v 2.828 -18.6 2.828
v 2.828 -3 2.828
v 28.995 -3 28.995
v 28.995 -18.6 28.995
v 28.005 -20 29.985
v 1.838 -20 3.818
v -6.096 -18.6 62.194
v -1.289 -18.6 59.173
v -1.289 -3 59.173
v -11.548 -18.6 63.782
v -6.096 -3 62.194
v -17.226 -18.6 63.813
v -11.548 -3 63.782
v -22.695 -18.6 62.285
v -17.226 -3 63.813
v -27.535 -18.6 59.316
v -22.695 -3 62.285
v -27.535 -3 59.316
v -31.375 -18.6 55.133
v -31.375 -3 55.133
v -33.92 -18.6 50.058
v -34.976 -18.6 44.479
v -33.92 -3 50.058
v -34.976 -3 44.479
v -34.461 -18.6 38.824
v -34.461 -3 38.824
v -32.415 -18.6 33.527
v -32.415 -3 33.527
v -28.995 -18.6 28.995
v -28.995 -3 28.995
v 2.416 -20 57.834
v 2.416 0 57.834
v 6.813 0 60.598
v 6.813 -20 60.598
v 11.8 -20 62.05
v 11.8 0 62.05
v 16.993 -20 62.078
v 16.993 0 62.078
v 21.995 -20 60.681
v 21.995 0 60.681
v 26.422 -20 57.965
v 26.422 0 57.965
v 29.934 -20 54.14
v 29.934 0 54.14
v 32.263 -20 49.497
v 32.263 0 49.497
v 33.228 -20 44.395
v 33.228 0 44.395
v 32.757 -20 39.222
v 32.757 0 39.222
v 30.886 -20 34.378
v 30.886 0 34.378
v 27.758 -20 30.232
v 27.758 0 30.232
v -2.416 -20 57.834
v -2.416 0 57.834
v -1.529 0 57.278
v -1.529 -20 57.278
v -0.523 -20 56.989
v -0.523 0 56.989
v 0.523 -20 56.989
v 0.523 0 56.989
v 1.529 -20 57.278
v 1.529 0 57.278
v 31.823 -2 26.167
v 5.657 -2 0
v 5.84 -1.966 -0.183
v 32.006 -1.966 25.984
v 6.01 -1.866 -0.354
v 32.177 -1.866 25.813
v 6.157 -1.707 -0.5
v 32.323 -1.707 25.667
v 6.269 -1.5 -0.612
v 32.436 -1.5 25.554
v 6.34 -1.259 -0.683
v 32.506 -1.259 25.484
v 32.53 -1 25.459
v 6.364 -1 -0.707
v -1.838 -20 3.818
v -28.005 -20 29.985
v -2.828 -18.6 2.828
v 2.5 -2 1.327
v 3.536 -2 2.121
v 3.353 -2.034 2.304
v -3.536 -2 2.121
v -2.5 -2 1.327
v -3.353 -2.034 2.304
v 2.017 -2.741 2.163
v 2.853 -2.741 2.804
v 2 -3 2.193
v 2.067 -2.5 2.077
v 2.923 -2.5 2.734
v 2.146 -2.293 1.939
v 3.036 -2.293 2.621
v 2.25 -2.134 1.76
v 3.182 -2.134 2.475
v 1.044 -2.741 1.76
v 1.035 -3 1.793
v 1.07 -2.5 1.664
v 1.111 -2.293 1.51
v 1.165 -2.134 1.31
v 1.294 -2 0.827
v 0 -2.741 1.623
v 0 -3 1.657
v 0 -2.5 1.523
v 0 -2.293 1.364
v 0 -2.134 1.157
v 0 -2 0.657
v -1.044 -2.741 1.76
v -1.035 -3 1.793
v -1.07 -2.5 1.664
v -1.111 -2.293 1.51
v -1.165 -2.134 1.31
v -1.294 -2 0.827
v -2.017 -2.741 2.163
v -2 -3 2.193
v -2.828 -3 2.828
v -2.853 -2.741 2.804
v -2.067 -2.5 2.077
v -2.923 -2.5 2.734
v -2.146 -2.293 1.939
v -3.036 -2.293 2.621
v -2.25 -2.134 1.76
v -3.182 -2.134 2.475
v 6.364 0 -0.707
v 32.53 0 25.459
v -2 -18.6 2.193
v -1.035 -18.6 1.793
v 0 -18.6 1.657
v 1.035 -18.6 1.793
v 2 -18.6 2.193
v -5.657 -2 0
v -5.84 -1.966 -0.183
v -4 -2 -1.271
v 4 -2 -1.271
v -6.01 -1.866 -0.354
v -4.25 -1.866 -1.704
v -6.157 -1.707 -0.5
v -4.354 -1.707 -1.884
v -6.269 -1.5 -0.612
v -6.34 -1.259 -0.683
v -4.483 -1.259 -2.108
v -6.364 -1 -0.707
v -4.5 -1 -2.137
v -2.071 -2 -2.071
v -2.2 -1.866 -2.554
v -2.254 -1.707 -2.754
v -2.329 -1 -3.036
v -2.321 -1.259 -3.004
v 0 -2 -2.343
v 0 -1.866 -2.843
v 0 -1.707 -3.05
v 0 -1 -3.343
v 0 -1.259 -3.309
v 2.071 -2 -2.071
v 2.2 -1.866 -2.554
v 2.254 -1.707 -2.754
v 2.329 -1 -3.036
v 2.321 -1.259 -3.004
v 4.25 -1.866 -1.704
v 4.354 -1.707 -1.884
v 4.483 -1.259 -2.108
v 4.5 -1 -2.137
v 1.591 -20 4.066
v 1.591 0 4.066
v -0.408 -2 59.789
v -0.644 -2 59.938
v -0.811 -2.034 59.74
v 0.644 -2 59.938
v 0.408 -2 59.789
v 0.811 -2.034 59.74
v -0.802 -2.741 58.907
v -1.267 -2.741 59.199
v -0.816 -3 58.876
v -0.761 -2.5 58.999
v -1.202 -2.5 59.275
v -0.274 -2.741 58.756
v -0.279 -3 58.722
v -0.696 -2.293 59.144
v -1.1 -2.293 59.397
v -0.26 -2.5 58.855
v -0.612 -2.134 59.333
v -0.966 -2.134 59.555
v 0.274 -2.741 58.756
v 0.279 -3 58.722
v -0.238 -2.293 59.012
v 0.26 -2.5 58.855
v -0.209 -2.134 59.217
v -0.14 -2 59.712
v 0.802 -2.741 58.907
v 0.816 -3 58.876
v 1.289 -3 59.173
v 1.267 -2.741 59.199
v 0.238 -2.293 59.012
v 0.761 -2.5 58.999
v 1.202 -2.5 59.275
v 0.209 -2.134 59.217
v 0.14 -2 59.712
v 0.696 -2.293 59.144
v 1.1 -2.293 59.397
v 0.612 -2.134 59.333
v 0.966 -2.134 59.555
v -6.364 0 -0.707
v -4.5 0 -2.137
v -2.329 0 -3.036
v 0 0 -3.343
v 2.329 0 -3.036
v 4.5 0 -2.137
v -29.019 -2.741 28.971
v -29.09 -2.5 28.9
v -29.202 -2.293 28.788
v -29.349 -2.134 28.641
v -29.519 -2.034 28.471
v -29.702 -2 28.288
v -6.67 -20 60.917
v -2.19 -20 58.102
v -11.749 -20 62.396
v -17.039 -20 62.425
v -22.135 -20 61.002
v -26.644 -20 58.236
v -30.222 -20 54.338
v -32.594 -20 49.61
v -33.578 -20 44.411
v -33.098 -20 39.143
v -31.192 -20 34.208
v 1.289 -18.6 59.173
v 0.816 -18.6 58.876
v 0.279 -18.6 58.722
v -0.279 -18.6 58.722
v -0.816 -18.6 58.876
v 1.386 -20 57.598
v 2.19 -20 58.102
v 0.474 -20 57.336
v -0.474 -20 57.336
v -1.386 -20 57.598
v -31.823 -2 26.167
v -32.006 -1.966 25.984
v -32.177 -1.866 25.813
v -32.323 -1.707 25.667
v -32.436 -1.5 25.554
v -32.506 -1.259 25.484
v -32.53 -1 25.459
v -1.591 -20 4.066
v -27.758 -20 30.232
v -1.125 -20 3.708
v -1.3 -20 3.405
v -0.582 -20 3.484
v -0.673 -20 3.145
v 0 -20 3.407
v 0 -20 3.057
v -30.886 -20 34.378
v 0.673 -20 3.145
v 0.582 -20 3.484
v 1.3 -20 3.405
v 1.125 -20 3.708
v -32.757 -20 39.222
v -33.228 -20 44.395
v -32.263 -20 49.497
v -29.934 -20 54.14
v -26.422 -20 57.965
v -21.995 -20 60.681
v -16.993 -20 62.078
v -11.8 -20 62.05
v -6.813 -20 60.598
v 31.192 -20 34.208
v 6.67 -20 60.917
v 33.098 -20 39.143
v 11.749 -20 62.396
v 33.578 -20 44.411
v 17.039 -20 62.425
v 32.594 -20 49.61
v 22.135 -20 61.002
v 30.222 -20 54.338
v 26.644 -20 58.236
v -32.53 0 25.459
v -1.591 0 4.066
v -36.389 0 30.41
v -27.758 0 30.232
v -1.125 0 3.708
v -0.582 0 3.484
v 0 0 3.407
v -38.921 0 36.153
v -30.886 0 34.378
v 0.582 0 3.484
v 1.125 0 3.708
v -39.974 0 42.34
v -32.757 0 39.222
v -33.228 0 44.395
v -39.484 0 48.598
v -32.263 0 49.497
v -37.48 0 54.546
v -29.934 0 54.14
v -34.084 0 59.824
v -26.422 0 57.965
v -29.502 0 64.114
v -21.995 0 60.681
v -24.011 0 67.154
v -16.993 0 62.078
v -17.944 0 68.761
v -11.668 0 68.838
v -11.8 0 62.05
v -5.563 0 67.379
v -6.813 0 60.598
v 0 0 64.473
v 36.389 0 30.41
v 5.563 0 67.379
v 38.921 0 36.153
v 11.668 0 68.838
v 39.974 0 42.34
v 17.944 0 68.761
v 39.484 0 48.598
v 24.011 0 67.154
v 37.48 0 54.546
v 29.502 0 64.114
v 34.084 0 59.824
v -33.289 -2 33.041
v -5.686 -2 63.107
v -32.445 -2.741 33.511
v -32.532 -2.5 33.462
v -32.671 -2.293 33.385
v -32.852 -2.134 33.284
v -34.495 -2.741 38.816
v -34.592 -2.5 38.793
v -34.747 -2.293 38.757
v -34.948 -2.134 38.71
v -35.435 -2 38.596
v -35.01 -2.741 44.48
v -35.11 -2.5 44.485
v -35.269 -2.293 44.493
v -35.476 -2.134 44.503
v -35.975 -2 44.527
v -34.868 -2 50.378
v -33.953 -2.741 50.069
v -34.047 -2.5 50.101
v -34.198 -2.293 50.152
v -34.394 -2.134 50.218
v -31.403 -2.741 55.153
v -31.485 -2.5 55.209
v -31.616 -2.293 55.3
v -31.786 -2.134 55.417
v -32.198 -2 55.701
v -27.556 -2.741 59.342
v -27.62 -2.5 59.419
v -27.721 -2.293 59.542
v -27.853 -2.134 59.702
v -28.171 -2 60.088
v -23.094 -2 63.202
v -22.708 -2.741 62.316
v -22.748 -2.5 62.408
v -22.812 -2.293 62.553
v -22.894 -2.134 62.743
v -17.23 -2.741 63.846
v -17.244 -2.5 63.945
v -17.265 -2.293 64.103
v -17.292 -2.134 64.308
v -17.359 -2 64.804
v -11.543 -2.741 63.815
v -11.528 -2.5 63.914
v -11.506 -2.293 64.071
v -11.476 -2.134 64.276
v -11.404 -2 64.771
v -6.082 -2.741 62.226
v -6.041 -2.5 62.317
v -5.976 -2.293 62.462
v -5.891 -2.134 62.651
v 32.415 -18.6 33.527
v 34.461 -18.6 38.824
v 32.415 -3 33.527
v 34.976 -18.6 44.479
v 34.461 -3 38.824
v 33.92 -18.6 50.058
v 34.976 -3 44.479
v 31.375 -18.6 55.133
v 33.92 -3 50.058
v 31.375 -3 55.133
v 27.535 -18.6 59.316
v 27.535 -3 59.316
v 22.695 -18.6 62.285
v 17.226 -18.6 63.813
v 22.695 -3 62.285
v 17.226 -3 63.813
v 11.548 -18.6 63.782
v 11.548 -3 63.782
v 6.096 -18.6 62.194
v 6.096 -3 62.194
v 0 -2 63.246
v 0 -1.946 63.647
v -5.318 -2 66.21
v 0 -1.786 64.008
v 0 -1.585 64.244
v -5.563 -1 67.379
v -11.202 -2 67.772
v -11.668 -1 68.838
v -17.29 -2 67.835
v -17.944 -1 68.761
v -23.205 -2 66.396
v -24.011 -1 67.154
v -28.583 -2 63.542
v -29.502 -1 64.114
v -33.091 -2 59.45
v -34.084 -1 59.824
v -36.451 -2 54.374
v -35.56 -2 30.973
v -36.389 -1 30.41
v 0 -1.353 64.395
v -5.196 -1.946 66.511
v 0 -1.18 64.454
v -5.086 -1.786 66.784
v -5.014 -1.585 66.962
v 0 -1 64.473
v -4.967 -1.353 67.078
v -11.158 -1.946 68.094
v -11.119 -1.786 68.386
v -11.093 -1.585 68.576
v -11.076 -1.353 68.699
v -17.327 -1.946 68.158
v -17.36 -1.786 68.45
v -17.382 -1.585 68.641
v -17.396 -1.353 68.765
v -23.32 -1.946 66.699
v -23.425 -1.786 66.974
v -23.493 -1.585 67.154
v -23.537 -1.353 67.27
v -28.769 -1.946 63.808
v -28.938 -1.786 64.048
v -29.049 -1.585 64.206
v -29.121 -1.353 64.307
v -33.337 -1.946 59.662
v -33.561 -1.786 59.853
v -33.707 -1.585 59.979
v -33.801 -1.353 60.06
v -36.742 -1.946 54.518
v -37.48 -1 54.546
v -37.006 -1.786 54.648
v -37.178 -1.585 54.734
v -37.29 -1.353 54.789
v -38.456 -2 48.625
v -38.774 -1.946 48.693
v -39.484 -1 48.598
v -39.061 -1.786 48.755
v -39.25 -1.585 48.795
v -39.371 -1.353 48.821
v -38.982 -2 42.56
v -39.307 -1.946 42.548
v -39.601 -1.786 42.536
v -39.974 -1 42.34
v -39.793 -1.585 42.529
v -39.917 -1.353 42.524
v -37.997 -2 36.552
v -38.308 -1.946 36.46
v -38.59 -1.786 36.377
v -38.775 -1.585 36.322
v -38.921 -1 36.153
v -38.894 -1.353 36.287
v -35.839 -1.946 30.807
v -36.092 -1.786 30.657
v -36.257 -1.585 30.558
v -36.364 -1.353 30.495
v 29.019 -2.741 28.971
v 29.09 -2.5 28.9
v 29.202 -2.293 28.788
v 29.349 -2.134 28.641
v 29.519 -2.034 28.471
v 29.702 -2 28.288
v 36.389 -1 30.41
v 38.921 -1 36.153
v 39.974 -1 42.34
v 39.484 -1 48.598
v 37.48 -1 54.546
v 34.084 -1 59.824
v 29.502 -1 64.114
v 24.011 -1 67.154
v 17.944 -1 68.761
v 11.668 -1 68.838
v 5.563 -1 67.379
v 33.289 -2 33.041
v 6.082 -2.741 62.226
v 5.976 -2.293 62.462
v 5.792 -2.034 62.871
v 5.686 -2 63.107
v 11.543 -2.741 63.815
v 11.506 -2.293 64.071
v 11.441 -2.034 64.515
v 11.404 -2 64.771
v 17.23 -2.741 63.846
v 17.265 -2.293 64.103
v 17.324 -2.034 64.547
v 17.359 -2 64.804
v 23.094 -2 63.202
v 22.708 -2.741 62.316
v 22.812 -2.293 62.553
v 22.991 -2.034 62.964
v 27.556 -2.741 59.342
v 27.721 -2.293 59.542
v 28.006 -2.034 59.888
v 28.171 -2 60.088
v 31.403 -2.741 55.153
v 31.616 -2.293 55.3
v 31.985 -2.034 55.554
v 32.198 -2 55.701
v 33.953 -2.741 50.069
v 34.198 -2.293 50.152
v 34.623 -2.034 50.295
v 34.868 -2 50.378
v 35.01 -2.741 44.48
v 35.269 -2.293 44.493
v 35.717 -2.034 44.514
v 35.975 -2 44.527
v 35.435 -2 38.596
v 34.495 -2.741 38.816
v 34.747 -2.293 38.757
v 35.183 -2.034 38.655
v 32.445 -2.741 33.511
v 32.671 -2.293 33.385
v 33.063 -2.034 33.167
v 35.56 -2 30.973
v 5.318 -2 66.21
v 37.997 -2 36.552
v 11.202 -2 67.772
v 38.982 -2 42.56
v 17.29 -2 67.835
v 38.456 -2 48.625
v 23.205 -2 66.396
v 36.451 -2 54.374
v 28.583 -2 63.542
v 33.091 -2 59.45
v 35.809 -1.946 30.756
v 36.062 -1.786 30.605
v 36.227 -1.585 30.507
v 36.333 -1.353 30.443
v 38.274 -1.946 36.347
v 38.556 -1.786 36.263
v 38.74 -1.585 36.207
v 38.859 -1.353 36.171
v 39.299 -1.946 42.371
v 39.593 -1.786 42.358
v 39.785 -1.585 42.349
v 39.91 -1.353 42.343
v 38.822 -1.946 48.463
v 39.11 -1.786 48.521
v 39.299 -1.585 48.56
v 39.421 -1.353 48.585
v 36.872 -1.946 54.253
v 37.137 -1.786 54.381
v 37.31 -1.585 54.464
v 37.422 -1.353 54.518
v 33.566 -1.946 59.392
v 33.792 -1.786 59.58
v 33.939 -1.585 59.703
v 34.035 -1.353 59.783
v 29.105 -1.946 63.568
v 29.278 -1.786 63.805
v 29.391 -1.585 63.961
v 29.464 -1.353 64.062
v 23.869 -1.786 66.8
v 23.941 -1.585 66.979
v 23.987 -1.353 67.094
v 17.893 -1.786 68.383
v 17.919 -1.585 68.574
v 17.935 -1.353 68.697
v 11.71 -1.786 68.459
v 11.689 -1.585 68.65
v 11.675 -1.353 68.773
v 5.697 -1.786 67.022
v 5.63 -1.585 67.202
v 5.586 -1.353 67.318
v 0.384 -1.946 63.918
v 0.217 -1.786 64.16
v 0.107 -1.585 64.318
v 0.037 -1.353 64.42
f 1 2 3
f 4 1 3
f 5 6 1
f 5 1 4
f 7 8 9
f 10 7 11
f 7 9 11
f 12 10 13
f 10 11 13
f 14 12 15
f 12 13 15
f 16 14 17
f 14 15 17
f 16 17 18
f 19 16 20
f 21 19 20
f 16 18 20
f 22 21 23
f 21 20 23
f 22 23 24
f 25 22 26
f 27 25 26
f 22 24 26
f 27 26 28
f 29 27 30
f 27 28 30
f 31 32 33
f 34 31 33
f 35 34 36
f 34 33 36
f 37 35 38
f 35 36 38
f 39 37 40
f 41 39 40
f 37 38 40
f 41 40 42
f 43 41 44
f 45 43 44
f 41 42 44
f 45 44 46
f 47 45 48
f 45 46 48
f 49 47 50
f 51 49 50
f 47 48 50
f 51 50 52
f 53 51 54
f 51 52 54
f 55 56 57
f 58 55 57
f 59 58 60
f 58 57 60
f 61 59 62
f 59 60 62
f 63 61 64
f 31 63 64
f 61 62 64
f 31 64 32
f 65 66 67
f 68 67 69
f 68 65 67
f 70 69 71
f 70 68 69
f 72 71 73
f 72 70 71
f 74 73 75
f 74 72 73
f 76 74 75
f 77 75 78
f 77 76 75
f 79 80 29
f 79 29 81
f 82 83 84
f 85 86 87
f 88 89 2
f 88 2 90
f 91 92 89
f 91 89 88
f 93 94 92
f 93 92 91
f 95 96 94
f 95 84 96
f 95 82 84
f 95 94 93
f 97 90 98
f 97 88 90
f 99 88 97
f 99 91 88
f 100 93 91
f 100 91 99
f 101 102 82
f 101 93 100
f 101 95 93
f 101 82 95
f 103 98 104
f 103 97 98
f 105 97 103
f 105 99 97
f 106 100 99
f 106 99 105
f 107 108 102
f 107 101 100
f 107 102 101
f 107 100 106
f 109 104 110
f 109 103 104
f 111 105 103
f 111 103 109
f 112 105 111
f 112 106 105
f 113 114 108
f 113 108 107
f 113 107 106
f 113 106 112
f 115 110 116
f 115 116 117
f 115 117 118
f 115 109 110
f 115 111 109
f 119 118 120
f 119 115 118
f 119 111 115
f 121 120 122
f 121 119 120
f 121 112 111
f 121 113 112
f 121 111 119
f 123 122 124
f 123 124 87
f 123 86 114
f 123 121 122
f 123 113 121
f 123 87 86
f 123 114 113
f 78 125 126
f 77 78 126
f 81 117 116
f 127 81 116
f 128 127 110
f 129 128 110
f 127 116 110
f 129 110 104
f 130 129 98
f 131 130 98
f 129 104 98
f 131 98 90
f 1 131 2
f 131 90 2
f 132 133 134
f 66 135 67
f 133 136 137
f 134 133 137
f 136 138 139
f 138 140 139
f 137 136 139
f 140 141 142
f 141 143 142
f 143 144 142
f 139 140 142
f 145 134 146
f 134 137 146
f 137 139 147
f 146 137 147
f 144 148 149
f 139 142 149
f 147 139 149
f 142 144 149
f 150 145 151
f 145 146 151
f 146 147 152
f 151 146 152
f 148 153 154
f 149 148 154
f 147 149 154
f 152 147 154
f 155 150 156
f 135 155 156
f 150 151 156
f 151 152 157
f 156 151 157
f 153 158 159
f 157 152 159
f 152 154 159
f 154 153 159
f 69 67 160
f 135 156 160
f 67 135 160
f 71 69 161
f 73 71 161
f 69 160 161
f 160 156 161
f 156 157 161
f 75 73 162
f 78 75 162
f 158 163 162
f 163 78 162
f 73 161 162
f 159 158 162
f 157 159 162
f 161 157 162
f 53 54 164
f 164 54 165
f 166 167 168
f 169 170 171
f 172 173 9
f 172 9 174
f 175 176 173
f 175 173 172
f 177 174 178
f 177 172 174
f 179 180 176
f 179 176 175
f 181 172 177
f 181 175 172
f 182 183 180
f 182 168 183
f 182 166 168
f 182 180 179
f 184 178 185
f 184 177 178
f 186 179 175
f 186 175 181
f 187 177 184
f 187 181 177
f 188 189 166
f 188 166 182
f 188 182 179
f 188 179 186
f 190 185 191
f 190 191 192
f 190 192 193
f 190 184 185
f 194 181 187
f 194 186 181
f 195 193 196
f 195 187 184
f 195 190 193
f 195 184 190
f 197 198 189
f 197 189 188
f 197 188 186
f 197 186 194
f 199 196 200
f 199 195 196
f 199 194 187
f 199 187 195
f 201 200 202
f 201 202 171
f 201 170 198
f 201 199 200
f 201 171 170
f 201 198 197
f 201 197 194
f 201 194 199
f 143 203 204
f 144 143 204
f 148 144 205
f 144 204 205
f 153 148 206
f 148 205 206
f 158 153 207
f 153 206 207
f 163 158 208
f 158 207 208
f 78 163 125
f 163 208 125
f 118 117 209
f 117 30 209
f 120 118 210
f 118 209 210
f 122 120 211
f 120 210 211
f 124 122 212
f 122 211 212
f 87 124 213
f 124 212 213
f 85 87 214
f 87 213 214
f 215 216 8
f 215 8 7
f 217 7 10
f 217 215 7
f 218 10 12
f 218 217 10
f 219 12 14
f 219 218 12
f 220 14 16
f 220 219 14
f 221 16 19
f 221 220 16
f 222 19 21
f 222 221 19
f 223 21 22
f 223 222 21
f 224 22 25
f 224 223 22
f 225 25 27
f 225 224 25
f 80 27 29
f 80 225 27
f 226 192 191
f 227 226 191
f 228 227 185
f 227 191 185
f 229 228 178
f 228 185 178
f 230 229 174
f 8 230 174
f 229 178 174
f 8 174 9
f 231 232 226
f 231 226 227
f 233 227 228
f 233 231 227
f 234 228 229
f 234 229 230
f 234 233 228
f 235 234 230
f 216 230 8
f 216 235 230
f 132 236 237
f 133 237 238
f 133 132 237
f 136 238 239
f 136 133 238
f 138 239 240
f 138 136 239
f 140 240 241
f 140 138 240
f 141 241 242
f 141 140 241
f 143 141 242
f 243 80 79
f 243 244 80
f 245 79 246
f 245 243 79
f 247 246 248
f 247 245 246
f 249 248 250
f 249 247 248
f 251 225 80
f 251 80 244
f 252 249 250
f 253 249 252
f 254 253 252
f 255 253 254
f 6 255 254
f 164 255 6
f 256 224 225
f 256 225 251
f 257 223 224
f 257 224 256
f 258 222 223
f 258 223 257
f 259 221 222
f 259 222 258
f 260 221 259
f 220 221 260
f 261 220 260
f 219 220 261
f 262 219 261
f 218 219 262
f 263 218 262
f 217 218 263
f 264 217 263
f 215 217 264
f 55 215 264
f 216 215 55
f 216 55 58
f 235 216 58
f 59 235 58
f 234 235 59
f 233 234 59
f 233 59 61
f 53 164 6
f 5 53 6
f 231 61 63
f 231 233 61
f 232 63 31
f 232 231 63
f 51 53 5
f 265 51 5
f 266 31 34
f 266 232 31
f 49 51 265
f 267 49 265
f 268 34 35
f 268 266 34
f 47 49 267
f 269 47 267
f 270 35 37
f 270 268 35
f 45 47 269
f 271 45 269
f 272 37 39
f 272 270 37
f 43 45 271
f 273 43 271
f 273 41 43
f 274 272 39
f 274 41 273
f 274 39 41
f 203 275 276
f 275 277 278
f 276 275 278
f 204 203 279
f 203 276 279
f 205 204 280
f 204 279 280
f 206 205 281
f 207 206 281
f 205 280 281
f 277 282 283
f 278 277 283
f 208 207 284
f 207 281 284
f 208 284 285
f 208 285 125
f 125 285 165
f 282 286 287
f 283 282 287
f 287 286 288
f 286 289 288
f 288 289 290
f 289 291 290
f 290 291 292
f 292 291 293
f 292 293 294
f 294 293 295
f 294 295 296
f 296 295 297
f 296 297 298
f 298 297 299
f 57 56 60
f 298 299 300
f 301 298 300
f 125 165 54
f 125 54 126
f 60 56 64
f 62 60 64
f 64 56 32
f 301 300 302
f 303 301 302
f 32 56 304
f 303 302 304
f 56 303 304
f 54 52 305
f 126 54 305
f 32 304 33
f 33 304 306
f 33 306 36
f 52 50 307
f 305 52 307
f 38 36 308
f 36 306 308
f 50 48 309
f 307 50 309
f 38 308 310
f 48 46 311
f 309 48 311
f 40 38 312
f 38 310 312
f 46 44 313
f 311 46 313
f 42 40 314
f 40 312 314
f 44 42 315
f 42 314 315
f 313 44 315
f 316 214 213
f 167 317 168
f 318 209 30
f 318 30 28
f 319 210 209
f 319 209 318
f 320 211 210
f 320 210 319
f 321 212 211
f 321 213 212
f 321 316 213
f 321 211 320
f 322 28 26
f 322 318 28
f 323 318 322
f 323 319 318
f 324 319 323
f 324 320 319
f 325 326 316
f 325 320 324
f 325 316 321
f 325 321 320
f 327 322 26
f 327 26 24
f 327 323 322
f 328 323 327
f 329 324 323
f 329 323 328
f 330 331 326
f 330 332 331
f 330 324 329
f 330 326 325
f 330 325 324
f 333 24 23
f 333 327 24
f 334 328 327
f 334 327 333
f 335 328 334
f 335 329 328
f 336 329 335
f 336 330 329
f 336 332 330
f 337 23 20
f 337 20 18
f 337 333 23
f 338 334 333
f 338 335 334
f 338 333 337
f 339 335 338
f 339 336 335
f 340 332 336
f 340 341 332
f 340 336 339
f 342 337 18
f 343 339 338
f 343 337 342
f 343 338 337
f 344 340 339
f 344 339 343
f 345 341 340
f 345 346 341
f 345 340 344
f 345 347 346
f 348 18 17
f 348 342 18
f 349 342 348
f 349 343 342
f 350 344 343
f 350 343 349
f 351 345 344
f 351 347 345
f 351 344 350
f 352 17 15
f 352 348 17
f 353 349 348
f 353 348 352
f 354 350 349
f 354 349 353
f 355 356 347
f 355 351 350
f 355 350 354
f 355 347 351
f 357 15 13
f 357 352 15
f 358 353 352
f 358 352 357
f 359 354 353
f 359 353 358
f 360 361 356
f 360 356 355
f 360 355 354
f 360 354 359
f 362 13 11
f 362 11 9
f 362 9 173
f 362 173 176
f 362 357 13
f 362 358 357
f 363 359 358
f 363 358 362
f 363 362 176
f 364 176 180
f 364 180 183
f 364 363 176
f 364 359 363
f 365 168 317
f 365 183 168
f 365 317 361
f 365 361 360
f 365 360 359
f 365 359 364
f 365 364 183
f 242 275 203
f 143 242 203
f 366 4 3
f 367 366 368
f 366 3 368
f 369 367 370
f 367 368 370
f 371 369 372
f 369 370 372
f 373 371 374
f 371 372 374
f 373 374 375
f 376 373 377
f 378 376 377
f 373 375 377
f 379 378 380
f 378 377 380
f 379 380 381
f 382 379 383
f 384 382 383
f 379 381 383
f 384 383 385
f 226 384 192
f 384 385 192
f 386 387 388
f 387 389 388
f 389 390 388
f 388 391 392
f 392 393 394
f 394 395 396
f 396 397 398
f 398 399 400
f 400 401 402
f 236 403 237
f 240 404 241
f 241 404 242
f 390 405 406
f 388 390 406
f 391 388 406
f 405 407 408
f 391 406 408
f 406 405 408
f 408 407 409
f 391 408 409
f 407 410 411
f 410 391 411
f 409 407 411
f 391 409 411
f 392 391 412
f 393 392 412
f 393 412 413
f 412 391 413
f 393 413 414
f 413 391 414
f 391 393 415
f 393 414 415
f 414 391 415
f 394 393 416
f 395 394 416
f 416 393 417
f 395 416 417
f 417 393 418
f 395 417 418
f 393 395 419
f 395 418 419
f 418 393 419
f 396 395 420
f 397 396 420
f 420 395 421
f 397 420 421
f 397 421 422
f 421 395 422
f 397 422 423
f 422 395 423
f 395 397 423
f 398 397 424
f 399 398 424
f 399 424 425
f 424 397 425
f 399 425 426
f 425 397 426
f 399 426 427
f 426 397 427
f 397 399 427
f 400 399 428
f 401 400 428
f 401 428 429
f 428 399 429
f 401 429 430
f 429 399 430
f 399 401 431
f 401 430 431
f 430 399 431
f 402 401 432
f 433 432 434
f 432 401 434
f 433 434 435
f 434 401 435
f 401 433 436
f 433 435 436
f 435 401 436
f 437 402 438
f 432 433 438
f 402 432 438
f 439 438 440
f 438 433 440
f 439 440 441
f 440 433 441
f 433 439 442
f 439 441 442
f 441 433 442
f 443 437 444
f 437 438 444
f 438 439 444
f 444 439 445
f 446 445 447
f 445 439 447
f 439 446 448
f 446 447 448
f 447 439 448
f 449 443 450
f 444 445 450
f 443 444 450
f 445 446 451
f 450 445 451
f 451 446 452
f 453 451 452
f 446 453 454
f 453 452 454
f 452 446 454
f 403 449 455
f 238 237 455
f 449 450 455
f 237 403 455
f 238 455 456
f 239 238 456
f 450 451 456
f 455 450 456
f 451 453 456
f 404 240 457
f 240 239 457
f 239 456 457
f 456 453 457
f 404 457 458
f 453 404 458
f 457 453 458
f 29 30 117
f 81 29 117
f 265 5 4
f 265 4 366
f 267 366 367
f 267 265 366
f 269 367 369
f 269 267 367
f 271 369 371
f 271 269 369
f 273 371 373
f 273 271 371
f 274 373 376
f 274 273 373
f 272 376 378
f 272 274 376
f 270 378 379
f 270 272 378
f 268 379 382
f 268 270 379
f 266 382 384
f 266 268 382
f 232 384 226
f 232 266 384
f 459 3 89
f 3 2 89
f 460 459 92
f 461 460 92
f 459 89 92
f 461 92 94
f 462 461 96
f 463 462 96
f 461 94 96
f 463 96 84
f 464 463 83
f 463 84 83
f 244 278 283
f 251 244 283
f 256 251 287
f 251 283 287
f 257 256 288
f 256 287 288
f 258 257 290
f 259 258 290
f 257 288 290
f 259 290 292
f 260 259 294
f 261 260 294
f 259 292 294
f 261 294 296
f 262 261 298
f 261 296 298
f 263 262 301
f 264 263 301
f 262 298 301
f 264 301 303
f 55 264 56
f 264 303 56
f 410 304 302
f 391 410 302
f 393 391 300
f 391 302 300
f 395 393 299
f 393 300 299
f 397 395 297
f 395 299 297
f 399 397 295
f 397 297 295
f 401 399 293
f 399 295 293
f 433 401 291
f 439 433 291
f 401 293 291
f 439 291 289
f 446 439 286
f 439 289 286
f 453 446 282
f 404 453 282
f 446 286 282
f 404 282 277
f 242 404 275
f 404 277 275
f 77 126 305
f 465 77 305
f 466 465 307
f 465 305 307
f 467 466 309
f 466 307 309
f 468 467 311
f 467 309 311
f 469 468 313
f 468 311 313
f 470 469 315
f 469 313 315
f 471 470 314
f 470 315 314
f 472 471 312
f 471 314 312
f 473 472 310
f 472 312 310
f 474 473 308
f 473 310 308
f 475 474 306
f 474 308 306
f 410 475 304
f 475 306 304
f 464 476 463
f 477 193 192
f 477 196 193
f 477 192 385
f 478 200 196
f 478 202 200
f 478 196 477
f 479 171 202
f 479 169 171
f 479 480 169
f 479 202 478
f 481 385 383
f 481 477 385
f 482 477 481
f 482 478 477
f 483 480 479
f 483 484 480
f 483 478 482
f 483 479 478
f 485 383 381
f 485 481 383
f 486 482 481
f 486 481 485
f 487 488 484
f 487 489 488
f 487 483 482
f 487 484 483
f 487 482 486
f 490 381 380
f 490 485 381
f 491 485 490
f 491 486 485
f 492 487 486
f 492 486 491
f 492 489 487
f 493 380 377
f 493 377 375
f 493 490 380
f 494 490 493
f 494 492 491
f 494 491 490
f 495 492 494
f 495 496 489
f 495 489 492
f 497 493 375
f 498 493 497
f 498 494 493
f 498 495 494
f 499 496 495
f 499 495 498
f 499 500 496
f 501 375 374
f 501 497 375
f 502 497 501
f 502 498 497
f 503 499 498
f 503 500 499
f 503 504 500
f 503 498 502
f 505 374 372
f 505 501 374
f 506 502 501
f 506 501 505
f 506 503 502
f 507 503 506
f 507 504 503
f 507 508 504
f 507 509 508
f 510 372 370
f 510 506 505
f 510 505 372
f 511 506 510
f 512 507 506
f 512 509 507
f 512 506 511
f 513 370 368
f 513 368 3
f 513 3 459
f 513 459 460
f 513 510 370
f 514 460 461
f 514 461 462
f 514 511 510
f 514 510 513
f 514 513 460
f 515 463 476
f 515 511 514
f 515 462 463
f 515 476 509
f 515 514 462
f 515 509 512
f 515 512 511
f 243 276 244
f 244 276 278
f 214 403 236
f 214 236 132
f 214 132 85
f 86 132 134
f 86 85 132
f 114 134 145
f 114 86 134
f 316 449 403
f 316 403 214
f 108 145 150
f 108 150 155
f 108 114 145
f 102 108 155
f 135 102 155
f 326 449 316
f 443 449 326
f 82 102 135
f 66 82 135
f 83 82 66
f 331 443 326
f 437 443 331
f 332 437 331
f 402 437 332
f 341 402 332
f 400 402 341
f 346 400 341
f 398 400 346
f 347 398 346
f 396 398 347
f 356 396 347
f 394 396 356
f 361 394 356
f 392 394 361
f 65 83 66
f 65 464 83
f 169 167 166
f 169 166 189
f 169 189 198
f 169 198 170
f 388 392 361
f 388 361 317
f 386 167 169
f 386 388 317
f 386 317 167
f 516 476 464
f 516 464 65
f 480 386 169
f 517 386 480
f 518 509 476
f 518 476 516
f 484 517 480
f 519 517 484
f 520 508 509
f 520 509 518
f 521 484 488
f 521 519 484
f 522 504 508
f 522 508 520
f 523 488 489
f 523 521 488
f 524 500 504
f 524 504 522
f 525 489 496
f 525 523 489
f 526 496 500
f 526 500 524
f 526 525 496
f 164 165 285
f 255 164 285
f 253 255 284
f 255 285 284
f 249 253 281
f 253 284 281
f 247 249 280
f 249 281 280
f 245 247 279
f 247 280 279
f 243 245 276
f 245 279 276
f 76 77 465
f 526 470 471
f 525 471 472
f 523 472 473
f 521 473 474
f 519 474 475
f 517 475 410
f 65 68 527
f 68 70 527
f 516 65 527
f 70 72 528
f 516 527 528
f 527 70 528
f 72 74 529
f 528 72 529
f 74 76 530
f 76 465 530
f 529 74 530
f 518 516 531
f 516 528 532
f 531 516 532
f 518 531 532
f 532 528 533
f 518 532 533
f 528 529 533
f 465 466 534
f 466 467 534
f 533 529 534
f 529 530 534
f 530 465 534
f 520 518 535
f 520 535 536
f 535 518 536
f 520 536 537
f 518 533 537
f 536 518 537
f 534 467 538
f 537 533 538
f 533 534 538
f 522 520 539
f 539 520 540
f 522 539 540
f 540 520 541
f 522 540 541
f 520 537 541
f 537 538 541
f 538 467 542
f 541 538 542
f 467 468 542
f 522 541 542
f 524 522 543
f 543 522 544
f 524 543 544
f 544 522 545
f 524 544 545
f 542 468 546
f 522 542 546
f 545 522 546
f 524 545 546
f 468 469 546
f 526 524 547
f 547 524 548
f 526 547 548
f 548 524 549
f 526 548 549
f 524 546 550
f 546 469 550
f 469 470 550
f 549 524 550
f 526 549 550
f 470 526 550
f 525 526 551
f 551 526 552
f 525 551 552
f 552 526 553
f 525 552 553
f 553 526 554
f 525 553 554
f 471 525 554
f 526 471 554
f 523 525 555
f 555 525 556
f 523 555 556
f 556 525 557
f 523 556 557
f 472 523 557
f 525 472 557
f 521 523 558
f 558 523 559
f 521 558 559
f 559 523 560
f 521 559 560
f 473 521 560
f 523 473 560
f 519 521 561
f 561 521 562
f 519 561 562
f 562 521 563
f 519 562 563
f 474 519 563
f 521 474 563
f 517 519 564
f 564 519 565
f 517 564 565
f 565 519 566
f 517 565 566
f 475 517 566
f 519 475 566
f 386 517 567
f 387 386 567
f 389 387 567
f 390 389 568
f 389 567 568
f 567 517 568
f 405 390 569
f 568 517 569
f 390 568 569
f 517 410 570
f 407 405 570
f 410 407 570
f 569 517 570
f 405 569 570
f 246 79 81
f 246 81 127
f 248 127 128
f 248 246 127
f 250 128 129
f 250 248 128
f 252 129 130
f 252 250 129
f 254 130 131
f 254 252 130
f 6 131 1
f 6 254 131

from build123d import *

# Parameters (mm, degrees)
F1_DEPTH = 20
F2_DEPTH = 2
F3_SIZE  = 1.4
F4_R     = 1


with BuildPart() as f1:
    # F0 (on Front) → F1 (new body)
    with BuildSketch(Plane.XZ):
        with BuildLine():
            Line((-28.994949, 28.994949), (-2.828427, 2.828427))
            ThreePointArc((-2.828427, 2.828427), (0, 1.656854), (2.828427, 2.828427))
            Line((2.828427, 2.828427), (28.994949, 28.994949))
            ThreePointArc((28.994949, 28.994949), (29.600194, 57.358261), (1.28852, 59.172891))
            ThreePointArc((1.28852, 59.172891), (0, 58.702505), (-1.28852, 59.172891))
            ThreePointArc((-1.28852, 59.172891), (-29.600194, 57.358261), (-28.994949, 28.994949))
        make_face()
        with BuildLine():
            ThreePointArc((1.59099, 4.065864), (0, 3.406854), (-1.59099, 4.065864))
            Line((-1.59099, 4.065864), (-27.757512, 30.232386))
            ThreePointArc((-27.757512, 30.232386), (-28.311096, 56.174738), (-2.415975, 57.83448))
            ThreePointArc((-2.415975, 57.83448), (0, 56.952505), (2.415975, 57.83448))
            ThreePointArc((2.415975, 57.83448), (28.311096, 56.174738), (27.757512, 30.232386))
            Line((27.757512, 30.232386), (1.59099, 4.065864))
        make_face(mode=Mode.SUBTRACT)
    extrude(amount=F1_DEPTH)

    # F0 (on Front) → F2 (join)
    with BuildSketch(Plane.XZ):
        with BuildLine():
            ThreePointArc((-6.363961, -0.707107), (0, -3.343146), (6.363961, -0.707107))
            Line((6.363961, -0.707107), (32.530483, 25.459415))
            ThreePointArc((32.530483, 25.459415), (34.084411, 59.824317), (0, 64.473416))
            ThreePointArc((0, 64.473416), (-34.084411, 59.824317), (-32.530483, 25.459415))
            Line((-32.530483, 25.459415), (-6.363961, -0.707107))
        make_face()
        with BuildLine():
            ThreePointArc((2.828427, 2.828427), (0, 1.656854), (-2.828427, 2.828427))
            Line((-2.828427, 2.828427), (-28.994949, 28.994949))
            ThreePointArc((-28.994949, 28.994949), (-29.600194, 57.358261), (-1.28852, 59.172891))
            ThreePointArc((-1.28852, 59.172891), (0, 58.702505), (1.28852, 59.172891))
            ThreePointArc((1.28852, 59.172891), (29.600194, 57.358261), (28.994949, 28.994949))
            Line((28.994949, 28.994949), (2.828427, 2.828427))
        make_face(mode=Mode.SUBTRACT)
    extrude(amount=F2_DEPTH)

    # F3
    f3_edges = [f1.edges().sort_by_distance(p)[0] for p in [
        (15.911688, -20, 15.911688),
    ]]
    chamfer(f3_edges, length=F3_SIZE)

    # F4
    f4_edges = [f1.edges().sort_by_distance(p)[0] for p in [
        (15.911688, -2, 15.911688),
        (19.447222, -2, 12.376154),
    ]]
    fillet(f4_edges, radius=F4_R)


solid = f1.part
